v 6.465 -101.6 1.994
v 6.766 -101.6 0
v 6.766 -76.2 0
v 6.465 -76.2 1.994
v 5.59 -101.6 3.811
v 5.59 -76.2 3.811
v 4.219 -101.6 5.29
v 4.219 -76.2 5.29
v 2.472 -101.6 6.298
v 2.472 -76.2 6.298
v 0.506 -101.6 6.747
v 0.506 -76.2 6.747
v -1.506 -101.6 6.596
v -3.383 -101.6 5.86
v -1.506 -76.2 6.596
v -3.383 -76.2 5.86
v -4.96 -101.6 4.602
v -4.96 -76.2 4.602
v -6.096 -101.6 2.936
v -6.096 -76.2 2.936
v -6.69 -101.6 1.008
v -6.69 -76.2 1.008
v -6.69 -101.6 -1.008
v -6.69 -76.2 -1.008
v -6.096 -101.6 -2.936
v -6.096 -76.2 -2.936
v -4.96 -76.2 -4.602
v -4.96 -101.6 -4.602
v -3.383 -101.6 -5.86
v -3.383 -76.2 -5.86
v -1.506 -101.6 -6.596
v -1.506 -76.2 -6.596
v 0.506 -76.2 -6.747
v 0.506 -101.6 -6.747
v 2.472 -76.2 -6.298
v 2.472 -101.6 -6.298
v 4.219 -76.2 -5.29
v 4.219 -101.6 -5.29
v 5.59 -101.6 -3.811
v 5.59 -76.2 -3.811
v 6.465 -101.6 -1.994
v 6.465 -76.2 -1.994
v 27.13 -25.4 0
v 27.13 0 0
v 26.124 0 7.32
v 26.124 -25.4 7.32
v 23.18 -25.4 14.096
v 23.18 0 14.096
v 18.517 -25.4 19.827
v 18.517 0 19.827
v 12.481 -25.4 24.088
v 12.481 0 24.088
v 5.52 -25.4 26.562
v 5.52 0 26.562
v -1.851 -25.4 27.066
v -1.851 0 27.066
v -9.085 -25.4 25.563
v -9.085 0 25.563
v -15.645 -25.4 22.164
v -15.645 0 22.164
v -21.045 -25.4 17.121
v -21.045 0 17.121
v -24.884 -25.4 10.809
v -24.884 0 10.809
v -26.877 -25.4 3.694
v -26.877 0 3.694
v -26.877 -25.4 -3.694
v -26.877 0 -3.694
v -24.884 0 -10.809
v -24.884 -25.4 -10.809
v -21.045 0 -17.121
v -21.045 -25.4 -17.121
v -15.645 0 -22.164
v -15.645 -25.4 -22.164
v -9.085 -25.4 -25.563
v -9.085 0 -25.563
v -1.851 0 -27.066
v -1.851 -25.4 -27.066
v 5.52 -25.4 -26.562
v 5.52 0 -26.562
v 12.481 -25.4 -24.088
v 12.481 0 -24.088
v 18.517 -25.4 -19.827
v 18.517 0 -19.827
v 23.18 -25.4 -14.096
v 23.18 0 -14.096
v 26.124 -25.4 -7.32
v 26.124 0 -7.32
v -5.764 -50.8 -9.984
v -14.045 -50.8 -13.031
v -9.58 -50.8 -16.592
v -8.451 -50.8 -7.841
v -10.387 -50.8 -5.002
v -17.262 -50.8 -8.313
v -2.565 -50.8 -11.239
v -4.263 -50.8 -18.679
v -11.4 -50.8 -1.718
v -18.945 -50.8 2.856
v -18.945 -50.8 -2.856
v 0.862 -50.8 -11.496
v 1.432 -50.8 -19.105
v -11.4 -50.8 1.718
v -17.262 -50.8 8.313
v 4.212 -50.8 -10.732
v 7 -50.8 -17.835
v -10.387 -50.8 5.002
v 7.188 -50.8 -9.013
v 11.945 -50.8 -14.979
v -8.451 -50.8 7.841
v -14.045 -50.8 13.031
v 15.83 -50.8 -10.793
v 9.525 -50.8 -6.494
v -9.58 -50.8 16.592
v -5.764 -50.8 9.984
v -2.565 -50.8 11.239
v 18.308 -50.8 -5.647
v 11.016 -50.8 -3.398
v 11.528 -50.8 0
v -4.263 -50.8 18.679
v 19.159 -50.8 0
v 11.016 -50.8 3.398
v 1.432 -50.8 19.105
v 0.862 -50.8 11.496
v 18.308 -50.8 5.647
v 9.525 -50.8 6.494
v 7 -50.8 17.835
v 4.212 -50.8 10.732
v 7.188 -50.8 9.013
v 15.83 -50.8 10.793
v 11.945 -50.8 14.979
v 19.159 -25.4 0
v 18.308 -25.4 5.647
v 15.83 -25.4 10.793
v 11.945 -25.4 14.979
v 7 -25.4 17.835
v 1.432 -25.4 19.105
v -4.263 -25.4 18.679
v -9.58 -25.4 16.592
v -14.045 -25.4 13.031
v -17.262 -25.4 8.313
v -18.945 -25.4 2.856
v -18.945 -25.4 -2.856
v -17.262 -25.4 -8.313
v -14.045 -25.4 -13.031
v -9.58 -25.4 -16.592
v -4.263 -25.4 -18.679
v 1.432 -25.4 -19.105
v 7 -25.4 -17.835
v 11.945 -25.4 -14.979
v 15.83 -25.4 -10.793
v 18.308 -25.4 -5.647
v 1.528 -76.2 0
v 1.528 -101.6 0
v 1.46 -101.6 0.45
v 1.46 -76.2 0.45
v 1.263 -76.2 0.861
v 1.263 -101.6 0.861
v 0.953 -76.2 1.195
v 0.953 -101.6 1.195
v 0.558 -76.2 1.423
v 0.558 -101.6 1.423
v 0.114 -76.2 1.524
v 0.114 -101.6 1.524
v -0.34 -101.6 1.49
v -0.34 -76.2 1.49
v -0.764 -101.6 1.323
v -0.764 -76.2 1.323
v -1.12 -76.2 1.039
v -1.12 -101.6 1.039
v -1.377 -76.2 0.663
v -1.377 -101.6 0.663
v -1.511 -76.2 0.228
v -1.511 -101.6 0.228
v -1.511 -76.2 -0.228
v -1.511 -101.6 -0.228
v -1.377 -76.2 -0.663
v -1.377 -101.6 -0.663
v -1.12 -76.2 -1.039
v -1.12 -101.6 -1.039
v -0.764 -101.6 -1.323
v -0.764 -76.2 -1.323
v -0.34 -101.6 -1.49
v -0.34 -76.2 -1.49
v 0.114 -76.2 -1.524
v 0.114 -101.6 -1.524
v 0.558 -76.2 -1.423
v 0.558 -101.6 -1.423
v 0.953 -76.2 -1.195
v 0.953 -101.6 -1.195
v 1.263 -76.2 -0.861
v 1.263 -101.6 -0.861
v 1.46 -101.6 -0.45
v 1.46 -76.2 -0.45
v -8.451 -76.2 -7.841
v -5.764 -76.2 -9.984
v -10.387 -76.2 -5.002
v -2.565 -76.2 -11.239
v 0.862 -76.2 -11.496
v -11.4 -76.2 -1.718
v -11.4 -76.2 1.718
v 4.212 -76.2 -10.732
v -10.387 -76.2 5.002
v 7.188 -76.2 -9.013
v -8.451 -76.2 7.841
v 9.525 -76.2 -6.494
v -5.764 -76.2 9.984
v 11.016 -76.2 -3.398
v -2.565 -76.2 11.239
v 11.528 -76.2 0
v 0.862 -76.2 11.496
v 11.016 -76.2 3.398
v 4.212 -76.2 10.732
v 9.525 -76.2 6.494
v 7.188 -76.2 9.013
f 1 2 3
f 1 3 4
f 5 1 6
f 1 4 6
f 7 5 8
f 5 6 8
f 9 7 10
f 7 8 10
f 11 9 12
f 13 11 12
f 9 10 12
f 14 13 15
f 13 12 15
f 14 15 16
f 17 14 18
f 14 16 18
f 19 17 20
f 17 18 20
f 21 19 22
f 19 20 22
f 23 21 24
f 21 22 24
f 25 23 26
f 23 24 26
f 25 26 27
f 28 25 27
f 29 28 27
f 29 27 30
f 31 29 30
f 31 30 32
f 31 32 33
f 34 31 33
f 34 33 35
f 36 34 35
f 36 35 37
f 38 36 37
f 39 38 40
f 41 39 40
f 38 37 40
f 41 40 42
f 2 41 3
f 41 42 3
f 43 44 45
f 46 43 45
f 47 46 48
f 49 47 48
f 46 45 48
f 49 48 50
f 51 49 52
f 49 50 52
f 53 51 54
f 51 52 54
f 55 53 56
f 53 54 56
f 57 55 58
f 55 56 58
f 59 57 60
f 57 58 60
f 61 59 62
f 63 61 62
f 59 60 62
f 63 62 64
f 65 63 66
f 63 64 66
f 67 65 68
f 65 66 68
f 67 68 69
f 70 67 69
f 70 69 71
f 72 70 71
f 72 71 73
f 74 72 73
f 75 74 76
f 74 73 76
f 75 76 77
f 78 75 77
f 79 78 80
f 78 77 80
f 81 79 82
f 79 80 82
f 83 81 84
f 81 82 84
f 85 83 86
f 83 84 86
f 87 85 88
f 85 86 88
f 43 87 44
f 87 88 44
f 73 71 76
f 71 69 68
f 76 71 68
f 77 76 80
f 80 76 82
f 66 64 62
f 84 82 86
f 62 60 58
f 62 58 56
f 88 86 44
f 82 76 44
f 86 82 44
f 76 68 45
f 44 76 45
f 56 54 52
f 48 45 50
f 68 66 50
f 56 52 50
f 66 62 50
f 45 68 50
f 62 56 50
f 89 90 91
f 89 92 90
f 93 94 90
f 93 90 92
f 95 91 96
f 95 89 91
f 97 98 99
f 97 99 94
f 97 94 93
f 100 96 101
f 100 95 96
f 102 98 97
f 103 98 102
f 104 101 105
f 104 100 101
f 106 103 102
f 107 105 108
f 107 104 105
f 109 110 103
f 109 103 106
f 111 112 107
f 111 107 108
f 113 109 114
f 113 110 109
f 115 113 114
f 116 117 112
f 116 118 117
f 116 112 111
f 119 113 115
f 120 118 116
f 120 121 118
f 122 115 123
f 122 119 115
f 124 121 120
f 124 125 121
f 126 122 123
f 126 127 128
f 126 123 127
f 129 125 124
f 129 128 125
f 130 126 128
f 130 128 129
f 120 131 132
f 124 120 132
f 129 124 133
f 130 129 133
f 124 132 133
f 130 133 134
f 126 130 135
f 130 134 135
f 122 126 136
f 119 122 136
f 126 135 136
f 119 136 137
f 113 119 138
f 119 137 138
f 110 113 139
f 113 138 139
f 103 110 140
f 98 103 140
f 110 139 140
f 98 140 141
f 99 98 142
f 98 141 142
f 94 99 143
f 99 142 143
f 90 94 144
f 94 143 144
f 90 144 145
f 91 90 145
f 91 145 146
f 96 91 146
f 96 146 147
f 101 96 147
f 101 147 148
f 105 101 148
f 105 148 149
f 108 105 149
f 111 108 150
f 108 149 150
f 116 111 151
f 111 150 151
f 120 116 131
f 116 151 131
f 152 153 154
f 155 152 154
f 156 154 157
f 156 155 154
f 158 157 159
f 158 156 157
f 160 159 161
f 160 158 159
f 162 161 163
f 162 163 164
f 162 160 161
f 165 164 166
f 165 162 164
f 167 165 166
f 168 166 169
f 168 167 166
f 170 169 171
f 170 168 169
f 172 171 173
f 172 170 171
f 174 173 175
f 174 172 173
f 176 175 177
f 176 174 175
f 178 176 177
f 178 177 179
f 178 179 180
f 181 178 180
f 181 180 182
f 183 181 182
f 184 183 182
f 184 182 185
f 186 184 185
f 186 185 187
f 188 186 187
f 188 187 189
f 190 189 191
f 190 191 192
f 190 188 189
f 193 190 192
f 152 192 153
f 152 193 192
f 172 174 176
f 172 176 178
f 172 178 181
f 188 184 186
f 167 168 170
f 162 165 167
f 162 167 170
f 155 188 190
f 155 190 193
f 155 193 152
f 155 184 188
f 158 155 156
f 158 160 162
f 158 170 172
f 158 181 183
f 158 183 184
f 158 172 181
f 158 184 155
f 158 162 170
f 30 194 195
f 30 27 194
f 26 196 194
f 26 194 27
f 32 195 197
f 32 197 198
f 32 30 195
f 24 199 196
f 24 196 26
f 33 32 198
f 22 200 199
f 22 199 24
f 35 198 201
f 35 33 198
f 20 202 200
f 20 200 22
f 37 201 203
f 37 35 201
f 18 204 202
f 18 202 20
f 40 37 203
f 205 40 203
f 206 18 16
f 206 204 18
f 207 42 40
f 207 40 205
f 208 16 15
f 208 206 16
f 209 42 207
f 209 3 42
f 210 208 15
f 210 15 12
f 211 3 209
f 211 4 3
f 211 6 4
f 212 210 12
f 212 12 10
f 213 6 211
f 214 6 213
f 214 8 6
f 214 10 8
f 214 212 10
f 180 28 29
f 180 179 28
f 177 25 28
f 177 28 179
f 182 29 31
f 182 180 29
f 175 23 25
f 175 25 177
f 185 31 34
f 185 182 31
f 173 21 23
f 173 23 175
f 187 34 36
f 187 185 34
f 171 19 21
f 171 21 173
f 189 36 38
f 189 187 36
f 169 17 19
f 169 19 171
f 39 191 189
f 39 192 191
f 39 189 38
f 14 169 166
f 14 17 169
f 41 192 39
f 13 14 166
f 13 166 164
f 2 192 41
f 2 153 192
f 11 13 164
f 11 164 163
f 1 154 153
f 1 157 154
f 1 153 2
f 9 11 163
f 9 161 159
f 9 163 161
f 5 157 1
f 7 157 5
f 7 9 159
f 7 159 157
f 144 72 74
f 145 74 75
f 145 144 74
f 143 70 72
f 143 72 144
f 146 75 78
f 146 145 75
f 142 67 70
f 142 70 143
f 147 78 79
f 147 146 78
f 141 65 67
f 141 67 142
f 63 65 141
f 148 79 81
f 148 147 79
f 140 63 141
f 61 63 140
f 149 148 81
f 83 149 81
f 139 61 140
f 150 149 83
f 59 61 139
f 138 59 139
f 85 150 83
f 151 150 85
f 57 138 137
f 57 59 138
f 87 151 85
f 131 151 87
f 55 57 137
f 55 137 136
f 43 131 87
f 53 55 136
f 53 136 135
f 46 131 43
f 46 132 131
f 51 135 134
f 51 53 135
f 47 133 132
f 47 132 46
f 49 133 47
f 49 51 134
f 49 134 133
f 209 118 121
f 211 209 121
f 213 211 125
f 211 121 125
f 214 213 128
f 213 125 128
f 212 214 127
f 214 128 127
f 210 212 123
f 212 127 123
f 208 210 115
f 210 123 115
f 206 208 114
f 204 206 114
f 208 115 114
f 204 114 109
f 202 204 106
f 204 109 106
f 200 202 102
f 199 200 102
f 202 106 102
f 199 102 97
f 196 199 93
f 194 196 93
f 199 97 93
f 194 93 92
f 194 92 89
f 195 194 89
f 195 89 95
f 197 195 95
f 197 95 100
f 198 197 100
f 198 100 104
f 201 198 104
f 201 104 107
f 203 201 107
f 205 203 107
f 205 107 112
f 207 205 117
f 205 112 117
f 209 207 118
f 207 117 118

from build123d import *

# Parameters (mm, degrees)
F0_R     = 27.1297247918
F1_DEPTH = 25.4
F2_R     = 19.1590274532
F3_DEPTH = 25.4
F4_R     = 11.5284679065
F5_DEPTH = 25.4
F6_R     = 6.766068174
F6_R_2   = 1.5282390362
F7_DEPTH = 25.4


# Not quite as in the source:
# - the program builds the solid bodies; features that only make, move or delete a surface that nothing else refers to are left out


with BuildPart() as f1:
    # F0 (on Front) → F1 (new body)
    with BuildSketch(Plane.XZ):
        Circle(F0_R)
    extrude(amount=F1_DEPTH)

    # F2 (on face) → F3 (join)
    with BuildSketch(Plane.XZ.offset(25.4)):
        Circle(F2_R)
    extrude(amount=F3_DEPTH)

    # F4 (on face) → F5 (join)
    with BuildSketch(Plane.XZ.offset(50.8)):
        Circle(F4_R)
    extrude(amount=F5_DEPTH)

    # F6 (on face) → F7 (join)
    with BuildSketch(Plane.XZ.offset(76.2)):
        Circle(F6_R)
        Circle(F6_R_2, mode=Mode.SUBTRACT)
    extrude(amount=F7_DEPTH)


solid = f1.part
